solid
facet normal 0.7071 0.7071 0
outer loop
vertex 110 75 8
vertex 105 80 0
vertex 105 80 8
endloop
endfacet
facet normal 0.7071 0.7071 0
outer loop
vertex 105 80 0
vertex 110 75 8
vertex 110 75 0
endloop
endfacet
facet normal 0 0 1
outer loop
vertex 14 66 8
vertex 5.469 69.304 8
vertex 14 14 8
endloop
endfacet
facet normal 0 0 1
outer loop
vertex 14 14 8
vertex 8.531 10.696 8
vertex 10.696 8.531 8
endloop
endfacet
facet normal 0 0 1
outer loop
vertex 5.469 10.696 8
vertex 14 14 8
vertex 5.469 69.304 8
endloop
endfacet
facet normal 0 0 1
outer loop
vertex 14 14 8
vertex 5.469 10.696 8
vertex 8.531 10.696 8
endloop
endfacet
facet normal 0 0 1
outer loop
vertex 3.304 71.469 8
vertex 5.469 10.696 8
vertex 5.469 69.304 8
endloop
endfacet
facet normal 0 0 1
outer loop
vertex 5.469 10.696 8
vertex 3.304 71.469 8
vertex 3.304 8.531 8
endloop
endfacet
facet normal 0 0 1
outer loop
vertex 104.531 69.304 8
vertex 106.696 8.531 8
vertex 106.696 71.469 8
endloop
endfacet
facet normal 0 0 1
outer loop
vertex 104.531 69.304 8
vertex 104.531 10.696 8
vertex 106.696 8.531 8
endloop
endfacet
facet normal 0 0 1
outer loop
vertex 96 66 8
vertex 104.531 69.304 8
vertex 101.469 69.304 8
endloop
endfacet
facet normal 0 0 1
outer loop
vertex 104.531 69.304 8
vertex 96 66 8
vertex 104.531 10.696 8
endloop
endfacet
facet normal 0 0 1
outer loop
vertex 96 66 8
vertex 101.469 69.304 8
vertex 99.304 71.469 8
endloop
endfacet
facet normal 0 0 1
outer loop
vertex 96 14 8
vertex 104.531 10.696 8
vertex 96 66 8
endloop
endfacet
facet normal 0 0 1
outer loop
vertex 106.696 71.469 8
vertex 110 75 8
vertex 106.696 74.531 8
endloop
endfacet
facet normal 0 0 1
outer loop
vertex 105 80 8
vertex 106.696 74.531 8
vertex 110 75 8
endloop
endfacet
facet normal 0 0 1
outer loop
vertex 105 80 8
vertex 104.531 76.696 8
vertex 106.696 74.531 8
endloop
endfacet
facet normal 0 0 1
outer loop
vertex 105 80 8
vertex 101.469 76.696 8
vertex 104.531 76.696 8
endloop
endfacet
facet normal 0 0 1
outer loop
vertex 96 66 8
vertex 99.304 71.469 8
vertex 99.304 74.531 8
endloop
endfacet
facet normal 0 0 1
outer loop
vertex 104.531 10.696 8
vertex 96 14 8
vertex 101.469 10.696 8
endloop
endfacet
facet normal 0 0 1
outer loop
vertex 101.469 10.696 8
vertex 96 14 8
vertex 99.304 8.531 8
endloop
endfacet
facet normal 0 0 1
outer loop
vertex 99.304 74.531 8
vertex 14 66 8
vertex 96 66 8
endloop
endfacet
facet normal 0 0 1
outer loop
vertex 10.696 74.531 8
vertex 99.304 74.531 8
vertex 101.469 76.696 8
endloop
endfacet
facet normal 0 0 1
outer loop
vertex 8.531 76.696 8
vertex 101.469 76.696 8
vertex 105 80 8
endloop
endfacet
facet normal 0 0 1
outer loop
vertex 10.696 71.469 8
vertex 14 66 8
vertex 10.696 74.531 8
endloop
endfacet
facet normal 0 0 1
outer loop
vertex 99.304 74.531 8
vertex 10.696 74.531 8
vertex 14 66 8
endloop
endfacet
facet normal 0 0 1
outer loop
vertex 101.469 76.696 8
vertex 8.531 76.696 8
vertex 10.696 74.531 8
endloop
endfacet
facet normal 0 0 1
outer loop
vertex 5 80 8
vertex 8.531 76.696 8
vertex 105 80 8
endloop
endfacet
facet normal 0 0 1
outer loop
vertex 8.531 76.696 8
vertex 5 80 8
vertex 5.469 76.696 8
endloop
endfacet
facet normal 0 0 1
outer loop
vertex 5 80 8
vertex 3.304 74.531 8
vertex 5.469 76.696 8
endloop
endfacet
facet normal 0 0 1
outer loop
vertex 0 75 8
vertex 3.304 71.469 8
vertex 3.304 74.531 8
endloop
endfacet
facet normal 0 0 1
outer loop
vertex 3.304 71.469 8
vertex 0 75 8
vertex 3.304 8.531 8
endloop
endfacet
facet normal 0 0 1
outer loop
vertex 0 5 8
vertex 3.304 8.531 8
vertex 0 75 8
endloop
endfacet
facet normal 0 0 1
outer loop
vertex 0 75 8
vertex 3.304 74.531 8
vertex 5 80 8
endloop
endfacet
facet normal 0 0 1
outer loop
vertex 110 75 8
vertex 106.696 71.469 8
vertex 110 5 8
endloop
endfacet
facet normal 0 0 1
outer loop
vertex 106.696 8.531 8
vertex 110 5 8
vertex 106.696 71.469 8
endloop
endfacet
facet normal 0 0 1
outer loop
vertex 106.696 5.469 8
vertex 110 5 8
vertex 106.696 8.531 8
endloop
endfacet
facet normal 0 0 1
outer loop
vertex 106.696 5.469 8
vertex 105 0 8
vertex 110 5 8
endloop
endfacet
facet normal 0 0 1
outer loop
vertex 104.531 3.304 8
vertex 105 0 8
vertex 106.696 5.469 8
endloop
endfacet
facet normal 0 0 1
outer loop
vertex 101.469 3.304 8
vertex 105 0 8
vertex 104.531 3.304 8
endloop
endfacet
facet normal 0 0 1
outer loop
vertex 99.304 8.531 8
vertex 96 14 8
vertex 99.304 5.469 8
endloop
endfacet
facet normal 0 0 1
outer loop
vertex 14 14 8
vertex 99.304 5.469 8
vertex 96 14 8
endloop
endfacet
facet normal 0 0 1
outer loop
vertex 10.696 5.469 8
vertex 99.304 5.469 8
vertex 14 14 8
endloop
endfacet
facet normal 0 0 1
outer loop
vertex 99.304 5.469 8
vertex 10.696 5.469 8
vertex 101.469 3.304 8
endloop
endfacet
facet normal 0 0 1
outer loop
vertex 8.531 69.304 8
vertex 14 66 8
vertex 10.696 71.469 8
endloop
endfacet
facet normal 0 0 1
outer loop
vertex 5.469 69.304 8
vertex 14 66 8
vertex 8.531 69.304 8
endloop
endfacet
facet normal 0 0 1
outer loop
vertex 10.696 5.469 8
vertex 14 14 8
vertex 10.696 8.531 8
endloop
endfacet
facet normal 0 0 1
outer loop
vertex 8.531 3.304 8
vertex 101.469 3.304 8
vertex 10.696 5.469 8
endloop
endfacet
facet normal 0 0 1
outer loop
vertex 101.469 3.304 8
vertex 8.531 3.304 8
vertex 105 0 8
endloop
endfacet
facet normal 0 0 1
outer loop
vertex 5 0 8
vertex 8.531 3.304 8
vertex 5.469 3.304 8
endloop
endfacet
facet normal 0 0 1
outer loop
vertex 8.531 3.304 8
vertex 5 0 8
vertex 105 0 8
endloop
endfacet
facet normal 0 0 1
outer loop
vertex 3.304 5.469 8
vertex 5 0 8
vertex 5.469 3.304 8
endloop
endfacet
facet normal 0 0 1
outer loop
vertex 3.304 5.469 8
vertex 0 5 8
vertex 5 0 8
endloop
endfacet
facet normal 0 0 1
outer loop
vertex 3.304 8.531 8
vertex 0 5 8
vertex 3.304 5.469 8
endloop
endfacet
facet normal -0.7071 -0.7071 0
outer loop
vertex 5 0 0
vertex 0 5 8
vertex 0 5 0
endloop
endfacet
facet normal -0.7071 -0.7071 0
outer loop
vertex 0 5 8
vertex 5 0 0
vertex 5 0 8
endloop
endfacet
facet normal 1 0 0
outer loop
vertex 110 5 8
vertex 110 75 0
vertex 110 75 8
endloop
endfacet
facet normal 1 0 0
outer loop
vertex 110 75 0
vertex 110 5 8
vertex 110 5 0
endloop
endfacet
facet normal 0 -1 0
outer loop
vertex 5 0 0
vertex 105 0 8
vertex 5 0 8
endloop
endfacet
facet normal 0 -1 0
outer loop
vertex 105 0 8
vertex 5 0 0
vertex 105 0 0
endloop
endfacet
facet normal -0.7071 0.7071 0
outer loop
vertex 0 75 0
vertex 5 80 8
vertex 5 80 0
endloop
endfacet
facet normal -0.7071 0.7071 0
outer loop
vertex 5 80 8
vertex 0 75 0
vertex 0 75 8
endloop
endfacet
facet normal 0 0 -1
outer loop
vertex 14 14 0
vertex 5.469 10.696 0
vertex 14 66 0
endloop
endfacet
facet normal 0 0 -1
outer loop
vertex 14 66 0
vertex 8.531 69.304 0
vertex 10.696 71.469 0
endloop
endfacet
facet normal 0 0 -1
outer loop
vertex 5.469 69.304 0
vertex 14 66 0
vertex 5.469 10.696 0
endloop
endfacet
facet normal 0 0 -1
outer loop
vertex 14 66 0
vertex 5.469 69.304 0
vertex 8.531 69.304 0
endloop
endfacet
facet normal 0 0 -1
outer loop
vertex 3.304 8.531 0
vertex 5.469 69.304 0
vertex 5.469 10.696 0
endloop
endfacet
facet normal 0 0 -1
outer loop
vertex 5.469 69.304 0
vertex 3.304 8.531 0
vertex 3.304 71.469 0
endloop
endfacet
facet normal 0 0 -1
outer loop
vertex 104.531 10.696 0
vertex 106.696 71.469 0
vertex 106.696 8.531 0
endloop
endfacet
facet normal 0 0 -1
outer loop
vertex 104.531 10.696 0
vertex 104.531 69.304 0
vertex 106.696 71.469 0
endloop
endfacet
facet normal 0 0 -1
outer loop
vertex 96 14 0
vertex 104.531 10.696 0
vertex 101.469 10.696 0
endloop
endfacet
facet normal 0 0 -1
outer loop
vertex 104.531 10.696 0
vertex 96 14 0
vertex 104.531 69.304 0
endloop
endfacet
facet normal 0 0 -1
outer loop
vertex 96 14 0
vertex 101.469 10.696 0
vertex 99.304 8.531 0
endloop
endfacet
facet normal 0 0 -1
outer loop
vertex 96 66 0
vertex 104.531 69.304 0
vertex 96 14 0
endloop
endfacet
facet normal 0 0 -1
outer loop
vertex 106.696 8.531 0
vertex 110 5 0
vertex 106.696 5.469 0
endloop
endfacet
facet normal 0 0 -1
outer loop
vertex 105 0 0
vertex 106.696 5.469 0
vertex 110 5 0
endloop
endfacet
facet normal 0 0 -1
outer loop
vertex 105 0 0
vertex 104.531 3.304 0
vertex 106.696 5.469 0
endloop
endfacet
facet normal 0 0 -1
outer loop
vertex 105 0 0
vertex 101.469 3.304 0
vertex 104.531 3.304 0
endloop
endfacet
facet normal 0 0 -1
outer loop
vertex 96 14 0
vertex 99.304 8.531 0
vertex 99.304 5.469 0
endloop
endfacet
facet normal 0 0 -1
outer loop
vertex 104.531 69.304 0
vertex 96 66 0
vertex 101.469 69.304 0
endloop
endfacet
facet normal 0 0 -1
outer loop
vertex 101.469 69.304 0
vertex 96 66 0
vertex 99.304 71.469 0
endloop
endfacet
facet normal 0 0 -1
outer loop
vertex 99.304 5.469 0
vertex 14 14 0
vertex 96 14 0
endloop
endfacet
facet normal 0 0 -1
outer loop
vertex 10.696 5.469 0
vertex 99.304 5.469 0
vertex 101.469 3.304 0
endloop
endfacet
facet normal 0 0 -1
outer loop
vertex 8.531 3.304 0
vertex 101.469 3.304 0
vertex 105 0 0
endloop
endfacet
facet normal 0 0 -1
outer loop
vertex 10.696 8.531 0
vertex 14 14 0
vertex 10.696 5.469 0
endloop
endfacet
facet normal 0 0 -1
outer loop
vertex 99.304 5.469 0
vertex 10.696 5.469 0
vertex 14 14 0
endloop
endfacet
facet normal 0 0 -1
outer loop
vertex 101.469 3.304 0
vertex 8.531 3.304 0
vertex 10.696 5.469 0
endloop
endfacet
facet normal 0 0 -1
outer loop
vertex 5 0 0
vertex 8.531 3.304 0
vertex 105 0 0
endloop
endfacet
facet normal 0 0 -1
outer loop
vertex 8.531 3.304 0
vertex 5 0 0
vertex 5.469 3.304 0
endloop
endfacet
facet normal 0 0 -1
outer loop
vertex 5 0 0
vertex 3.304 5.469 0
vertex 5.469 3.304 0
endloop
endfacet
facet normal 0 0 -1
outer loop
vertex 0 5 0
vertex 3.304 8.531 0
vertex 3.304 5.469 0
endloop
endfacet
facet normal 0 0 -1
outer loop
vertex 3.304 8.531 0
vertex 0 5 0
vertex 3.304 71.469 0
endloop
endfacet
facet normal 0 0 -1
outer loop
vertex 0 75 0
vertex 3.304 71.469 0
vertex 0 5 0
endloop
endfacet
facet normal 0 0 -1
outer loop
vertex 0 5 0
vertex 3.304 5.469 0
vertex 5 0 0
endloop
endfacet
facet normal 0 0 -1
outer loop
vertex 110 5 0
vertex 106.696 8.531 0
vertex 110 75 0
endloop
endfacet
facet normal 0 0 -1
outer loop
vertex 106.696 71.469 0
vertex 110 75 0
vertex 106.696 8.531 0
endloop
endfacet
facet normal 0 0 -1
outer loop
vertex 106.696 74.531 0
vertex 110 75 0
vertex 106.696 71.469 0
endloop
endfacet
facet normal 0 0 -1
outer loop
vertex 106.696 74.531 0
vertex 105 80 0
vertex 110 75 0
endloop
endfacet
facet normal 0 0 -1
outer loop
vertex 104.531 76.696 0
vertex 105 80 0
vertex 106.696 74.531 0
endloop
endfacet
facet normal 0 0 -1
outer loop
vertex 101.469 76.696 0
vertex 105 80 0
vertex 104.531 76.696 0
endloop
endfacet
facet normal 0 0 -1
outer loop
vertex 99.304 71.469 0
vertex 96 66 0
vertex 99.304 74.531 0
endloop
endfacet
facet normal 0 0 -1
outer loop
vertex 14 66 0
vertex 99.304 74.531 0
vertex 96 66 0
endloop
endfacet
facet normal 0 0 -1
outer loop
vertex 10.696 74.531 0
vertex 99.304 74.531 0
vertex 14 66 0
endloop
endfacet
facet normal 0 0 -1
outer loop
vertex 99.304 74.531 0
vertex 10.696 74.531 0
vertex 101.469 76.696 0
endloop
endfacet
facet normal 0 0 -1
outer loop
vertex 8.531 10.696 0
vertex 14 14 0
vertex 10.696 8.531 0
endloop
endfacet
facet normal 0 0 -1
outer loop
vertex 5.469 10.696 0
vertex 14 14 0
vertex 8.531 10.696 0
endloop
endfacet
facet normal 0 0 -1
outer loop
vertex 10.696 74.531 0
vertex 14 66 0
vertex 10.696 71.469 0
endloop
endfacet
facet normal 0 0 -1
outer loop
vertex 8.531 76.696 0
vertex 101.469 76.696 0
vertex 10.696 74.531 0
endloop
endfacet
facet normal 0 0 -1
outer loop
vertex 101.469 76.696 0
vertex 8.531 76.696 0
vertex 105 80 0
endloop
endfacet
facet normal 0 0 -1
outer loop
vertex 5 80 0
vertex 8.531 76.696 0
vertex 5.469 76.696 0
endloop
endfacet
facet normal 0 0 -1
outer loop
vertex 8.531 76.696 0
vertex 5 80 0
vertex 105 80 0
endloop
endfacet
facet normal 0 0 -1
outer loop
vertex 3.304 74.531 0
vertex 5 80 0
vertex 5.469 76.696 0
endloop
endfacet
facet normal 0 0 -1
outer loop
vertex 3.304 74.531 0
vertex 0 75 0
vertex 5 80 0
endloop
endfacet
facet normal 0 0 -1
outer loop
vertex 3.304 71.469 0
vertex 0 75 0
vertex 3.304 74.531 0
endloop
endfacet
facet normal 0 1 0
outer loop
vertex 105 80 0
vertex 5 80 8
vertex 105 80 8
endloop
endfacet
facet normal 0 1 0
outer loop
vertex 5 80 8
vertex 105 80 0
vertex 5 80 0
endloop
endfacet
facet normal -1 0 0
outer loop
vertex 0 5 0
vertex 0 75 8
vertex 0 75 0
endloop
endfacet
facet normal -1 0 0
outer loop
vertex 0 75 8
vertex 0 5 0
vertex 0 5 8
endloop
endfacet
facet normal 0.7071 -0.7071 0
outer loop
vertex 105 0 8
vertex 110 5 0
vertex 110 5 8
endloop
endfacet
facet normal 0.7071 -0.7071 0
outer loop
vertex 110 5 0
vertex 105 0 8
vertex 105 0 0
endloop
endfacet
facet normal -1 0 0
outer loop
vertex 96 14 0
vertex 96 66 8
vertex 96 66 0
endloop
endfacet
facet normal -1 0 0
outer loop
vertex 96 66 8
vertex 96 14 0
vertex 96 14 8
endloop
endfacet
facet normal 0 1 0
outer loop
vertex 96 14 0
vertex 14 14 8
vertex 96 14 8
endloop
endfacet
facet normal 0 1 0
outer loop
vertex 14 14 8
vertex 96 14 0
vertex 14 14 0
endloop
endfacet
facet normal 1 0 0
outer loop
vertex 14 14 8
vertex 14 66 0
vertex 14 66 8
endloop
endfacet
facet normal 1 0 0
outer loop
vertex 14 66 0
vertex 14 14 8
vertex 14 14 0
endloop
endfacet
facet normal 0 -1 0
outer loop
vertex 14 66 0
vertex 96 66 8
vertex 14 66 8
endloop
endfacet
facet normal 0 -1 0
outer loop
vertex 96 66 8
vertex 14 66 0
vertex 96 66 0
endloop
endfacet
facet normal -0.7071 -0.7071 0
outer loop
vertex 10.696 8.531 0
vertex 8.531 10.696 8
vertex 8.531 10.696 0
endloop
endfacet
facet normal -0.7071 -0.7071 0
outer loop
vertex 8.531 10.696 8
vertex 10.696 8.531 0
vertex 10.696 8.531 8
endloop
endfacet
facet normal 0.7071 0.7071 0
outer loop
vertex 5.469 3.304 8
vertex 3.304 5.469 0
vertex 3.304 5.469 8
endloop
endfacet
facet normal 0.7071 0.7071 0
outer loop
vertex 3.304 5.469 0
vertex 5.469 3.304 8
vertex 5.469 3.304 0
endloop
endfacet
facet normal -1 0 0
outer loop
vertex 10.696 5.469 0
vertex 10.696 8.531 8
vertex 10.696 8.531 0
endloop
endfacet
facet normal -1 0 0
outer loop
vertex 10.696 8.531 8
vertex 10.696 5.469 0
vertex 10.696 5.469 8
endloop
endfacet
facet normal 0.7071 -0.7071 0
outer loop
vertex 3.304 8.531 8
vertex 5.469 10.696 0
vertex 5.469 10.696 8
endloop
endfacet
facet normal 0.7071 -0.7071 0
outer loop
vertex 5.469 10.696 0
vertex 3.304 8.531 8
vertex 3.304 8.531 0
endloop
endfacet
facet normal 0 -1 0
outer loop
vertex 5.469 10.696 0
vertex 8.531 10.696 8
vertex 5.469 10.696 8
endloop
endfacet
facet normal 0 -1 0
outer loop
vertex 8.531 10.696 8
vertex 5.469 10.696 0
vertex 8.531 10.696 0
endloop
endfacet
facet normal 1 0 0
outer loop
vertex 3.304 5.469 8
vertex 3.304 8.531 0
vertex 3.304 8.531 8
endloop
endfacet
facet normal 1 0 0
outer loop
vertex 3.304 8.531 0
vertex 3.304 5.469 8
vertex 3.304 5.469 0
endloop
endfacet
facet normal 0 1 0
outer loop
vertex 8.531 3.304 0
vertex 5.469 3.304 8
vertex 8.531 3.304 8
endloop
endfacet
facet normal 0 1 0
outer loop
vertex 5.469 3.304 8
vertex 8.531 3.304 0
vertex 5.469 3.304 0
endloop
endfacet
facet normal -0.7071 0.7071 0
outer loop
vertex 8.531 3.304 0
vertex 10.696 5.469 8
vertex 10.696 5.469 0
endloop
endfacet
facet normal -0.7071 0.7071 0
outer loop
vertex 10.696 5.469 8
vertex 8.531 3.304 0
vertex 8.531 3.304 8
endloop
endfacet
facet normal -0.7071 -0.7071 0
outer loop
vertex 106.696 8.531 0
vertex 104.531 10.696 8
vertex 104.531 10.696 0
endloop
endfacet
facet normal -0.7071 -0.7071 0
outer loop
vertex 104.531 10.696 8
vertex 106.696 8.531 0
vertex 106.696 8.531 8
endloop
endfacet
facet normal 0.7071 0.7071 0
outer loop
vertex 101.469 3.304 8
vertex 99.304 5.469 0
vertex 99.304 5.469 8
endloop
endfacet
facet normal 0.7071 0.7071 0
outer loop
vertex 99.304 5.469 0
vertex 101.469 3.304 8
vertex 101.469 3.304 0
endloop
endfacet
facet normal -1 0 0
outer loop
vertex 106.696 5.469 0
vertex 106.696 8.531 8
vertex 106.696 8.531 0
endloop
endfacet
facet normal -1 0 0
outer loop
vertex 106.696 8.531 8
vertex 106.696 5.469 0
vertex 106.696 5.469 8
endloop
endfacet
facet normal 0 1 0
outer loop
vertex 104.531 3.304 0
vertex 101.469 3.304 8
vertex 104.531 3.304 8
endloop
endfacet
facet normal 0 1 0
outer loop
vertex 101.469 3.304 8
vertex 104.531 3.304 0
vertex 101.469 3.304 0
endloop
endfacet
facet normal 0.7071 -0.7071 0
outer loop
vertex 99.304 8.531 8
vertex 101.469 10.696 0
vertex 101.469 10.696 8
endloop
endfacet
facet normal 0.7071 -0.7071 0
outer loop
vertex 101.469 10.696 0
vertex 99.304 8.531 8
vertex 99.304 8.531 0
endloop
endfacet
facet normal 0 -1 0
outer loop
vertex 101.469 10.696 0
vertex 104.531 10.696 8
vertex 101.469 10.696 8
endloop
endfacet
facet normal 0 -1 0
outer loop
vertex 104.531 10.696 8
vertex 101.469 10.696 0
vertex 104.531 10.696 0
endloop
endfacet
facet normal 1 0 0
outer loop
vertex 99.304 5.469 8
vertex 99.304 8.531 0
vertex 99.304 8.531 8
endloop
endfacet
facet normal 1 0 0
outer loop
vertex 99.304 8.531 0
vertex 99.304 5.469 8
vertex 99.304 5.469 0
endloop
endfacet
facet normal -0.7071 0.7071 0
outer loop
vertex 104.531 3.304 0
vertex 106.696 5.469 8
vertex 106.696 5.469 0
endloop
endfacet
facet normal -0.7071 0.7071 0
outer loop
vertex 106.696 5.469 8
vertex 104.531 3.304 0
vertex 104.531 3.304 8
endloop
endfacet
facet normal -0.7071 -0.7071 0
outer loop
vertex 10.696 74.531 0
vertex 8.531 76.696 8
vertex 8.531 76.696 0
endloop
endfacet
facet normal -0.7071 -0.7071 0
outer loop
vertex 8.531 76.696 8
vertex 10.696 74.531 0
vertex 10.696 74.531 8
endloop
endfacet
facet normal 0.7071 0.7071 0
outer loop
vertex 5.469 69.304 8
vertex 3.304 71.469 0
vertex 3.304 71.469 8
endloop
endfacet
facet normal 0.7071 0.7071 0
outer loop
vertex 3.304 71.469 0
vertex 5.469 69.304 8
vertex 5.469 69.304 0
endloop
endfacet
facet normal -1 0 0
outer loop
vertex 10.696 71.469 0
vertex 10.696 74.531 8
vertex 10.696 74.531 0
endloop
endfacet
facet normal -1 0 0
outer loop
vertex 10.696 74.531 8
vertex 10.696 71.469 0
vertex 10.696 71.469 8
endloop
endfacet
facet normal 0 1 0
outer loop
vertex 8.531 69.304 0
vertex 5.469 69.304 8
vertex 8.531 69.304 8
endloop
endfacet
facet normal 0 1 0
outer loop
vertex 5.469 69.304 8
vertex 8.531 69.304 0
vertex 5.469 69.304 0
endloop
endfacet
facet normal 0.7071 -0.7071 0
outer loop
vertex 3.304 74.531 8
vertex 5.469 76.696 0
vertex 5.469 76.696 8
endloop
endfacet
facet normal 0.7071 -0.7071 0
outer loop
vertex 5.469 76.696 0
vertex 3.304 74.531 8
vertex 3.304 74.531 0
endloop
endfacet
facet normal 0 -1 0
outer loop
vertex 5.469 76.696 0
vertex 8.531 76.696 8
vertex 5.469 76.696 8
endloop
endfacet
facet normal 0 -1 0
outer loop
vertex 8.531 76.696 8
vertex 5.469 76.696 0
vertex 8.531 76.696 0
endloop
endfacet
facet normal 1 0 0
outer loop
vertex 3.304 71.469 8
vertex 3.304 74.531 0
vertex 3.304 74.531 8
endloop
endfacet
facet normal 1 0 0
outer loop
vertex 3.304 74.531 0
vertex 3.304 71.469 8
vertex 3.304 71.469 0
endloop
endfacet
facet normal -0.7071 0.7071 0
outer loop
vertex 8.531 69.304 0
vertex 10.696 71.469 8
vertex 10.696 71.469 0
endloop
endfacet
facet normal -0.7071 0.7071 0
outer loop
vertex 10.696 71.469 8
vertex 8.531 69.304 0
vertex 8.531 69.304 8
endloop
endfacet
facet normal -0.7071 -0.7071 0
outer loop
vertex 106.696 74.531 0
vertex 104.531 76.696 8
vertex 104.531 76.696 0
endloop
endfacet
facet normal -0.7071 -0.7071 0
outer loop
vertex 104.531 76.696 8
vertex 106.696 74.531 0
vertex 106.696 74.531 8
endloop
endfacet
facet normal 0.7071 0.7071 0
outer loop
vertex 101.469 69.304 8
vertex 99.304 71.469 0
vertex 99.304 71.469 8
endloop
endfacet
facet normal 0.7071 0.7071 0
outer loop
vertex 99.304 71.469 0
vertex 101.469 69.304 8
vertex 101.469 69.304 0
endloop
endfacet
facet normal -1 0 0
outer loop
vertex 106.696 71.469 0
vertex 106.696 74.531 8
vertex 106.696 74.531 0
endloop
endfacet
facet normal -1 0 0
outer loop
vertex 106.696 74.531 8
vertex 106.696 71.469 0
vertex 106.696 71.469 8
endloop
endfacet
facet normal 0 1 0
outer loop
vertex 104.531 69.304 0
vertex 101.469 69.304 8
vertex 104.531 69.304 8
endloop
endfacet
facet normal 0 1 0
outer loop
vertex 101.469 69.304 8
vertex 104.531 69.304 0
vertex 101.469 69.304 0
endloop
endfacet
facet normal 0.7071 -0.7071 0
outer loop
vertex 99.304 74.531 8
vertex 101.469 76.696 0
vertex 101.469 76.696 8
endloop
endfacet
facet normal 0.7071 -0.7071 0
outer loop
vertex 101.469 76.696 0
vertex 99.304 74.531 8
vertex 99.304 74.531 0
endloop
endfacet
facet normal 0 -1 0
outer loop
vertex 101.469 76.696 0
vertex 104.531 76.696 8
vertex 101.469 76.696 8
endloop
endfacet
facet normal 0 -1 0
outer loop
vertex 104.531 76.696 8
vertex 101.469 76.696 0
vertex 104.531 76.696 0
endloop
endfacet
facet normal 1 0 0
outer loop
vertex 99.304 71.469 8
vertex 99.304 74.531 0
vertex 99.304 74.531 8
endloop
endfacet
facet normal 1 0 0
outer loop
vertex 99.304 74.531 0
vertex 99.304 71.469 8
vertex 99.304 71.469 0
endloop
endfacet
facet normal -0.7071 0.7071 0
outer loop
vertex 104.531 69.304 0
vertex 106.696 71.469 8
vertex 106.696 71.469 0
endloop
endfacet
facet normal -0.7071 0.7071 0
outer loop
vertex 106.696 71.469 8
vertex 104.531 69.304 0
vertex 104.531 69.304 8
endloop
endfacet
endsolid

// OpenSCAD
$fn = 32;

// ----------------------------------------------------------------------
// Frame plate: 110 x 80 frame, 14 mm rails
// ----------------------------------------------------------------------

// --- parameters (mm) ---
plate_l = 110;            // plate length, X
plate_w = 80;             // plate width, Y
plate_t = 8;              // plate thickness, Z (extrusion height)
corner_c = 5;             // corner chamfer
frame_bar = 14;           // frame rail width
bolt_r = 4;               // corner bolt window radius
bolt_inset = 7;           // bolt centre inset from the edges
fit_tol = 0.1;            // declared fit tolerance (prompt contract)
free_tol = 0.5;           // declared free tolerance (prompt contract)

win_l = plate_l - 2 * frame_bar;  // window length
win_w = plate_w - 2 * frame_bar;  // window width
bolt_d = 2 * bolt_r;  // corner hole diameter

profile = [[5, 0], [105, 0], [110, 5], [110, 75], [105, 80], [5, 80], [0, 75], [0, 5]];  // primary outline, 8 points, counter clockwise
void_1 = [[14, 14], [96, 14], [96, 66], [14, 66]];  // the window, 4 points
void_2 = [[10.696, 8.531], [8.531, 10.696], [5.469, 10.696], [3.304, 8.531], [3.304, 5.469], [5.469, 3.304], [8.531, 3.304], [10.696, 5.469]];  // corner bolt window, 8 points
void_3 = [[106.696, 8.531], [104.531, 10.696], [101.469, 10.696], [99.304, 8.531], [99.304, 5.469], [101.469, 3.304], [104.531, 3.304], [106.696, 5.469]];  // corner bolt window, 8 points
void_4 = [[10.696, 74.531], [8.531, 76.696], [5.469, 76.696], [3.304, 74.531], [3.304, 71.469], [5.469, 69.304], [8.531, 69.304], [10.696, 71.469]];  // corner bolt window, 8 points
void_5 = [[106.696, 74.531], [104.531, 76.696], [101.469, 76.696], [99.304, 74.531], [99.304, 71.469], [101.469, 69.304], [104.531, 69.304], [106.696, 71.469]];  // corner bolt window, 8 points

// --- the one profile operation ---
difference() {
  linear_extrude(height = plate_t) polygon(points = profile);
  translate([0, 0, -1])
    linear_extrude(height = plate_t + 2) polygon(points = void_1);
  translate([0, 0, -1])
    linear_extrude(height = plate_t + 2) polygon(points = void_2);
  translate([0, 0, -1])
    linear_extrude(height = plate_t + 2) polygon(points = void_3);
  translate([0, 0, -1])
    linear_extrude(height = plate_t + 2) polygon(points = void_4);
  translate([0, 0, -1])
    linear_extrude(height = plate_t + 2) polygon(points = void_5);
}
